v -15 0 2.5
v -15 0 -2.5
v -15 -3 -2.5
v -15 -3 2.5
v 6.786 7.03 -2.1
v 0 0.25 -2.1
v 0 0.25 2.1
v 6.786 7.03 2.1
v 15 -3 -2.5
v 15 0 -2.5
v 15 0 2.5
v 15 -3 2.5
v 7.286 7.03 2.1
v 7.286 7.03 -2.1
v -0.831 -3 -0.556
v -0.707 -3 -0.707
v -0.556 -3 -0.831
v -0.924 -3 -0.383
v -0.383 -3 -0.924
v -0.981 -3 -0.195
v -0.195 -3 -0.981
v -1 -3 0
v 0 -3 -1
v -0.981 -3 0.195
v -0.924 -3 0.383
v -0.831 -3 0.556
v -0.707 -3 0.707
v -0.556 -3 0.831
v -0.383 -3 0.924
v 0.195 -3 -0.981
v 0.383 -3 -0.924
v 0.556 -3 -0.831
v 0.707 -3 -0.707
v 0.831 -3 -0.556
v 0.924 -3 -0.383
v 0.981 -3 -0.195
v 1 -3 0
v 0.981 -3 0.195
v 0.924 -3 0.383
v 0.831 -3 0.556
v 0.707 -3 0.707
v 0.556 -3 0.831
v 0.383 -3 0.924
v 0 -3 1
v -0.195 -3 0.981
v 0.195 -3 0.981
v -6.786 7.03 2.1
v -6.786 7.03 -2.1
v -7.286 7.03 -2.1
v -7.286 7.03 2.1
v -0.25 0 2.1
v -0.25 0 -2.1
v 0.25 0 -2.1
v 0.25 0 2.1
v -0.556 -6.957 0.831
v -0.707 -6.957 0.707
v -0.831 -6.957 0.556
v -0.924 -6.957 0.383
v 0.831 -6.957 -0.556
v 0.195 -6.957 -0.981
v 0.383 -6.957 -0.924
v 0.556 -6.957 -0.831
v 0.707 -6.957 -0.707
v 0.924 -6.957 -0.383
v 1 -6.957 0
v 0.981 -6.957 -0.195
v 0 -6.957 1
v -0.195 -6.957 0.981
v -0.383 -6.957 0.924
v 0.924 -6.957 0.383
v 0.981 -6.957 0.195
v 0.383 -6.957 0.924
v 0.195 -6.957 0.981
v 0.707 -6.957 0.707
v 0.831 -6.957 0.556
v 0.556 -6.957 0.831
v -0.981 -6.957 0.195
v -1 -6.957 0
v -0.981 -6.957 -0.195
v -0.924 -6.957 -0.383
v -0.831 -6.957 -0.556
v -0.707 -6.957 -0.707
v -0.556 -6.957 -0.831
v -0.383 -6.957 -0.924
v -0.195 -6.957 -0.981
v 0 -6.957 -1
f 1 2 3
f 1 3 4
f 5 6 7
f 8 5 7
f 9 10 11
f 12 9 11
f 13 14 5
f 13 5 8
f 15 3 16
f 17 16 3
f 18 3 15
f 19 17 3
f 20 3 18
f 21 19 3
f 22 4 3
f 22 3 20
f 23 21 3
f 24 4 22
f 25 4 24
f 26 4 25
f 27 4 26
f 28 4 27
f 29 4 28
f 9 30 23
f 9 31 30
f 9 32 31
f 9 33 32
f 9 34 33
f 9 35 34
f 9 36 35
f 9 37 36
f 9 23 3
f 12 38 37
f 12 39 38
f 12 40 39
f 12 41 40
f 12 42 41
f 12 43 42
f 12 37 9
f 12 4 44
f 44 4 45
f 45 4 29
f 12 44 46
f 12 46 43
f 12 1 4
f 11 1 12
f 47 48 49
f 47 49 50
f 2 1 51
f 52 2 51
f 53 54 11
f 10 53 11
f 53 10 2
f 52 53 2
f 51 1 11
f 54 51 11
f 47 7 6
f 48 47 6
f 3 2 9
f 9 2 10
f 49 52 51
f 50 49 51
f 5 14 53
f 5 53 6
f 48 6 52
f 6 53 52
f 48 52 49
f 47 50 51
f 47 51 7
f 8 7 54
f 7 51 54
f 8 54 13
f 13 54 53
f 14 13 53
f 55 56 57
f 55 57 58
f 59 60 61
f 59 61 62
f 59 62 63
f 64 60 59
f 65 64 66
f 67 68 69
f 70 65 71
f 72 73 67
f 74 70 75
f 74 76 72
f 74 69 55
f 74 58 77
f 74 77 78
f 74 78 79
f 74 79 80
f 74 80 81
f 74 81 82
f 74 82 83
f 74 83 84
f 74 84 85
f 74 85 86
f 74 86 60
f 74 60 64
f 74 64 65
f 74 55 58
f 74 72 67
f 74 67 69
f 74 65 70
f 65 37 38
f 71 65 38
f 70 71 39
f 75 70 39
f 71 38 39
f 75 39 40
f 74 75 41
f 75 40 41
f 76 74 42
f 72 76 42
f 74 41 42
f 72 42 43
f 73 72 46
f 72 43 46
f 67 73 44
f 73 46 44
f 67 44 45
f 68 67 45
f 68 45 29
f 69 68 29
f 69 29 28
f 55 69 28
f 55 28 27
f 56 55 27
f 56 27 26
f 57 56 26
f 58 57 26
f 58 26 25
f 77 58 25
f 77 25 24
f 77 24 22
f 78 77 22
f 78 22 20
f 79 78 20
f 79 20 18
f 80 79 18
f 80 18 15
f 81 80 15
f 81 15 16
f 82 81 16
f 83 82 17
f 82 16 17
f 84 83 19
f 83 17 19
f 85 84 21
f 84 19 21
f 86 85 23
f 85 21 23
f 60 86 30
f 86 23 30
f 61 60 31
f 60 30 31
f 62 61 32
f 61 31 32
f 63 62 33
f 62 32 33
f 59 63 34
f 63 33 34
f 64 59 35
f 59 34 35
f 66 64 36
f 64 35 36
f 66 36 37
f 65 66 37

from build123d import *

# Parameters (mm, degrees)
F0_W     = 30
F0_H     = 5
F0_R     = 1
F1_DEPTH = 3
F2_DEPTH = 6.95745
F4_W     = 0.5
F4_H     = 4.2


with BuildPart() as f1:
    # F0 (on Front) → F1 (new body)
    with BuildSketch(Plane.XZ):
        Rectangle(F0_W, F0_H)
        Circle(F0_R, mode=Mode.SUBTRACT)
    extrude(amount=F1_DEPTH)

    # F0 (on Front) → F2 (join)
    with BuildSketch(Plane.XZ):
        Circle(F0_R)
    extrude(amount=F2_DEPTH)

    # F5: sweep along a path in F3
    with BuildLine(Plane.XY) as f5_path:
        Line((-7.035956, 7.03008), (0, 0))
    # F4 (on face) → F5 (sweep)
    with BuildSketch(Plane(origin=(0, 0, 0), x_dir=(-1, 0, 0), z_dir=(0, 1, 0))):
        Rectangle(F4_W, F4_H)
    sweep(path=f5_path.line)

    # F6: sweep along a path in F3
    with BuildLine(Plane.XY) as f6_path:
        Line((7.035956, 7.03008), (0, 0))
    # F4 (on face) → F6 (sweep)
    with BuildSketch(Plane(origin=(0, 0, 0), x_dir=(-1, 0, 0), z_dir=(0, 1, 0))):
        Rectangle(F4_W, F4_H)
    sweep(path=f6_path.line)


solid = f1.part
